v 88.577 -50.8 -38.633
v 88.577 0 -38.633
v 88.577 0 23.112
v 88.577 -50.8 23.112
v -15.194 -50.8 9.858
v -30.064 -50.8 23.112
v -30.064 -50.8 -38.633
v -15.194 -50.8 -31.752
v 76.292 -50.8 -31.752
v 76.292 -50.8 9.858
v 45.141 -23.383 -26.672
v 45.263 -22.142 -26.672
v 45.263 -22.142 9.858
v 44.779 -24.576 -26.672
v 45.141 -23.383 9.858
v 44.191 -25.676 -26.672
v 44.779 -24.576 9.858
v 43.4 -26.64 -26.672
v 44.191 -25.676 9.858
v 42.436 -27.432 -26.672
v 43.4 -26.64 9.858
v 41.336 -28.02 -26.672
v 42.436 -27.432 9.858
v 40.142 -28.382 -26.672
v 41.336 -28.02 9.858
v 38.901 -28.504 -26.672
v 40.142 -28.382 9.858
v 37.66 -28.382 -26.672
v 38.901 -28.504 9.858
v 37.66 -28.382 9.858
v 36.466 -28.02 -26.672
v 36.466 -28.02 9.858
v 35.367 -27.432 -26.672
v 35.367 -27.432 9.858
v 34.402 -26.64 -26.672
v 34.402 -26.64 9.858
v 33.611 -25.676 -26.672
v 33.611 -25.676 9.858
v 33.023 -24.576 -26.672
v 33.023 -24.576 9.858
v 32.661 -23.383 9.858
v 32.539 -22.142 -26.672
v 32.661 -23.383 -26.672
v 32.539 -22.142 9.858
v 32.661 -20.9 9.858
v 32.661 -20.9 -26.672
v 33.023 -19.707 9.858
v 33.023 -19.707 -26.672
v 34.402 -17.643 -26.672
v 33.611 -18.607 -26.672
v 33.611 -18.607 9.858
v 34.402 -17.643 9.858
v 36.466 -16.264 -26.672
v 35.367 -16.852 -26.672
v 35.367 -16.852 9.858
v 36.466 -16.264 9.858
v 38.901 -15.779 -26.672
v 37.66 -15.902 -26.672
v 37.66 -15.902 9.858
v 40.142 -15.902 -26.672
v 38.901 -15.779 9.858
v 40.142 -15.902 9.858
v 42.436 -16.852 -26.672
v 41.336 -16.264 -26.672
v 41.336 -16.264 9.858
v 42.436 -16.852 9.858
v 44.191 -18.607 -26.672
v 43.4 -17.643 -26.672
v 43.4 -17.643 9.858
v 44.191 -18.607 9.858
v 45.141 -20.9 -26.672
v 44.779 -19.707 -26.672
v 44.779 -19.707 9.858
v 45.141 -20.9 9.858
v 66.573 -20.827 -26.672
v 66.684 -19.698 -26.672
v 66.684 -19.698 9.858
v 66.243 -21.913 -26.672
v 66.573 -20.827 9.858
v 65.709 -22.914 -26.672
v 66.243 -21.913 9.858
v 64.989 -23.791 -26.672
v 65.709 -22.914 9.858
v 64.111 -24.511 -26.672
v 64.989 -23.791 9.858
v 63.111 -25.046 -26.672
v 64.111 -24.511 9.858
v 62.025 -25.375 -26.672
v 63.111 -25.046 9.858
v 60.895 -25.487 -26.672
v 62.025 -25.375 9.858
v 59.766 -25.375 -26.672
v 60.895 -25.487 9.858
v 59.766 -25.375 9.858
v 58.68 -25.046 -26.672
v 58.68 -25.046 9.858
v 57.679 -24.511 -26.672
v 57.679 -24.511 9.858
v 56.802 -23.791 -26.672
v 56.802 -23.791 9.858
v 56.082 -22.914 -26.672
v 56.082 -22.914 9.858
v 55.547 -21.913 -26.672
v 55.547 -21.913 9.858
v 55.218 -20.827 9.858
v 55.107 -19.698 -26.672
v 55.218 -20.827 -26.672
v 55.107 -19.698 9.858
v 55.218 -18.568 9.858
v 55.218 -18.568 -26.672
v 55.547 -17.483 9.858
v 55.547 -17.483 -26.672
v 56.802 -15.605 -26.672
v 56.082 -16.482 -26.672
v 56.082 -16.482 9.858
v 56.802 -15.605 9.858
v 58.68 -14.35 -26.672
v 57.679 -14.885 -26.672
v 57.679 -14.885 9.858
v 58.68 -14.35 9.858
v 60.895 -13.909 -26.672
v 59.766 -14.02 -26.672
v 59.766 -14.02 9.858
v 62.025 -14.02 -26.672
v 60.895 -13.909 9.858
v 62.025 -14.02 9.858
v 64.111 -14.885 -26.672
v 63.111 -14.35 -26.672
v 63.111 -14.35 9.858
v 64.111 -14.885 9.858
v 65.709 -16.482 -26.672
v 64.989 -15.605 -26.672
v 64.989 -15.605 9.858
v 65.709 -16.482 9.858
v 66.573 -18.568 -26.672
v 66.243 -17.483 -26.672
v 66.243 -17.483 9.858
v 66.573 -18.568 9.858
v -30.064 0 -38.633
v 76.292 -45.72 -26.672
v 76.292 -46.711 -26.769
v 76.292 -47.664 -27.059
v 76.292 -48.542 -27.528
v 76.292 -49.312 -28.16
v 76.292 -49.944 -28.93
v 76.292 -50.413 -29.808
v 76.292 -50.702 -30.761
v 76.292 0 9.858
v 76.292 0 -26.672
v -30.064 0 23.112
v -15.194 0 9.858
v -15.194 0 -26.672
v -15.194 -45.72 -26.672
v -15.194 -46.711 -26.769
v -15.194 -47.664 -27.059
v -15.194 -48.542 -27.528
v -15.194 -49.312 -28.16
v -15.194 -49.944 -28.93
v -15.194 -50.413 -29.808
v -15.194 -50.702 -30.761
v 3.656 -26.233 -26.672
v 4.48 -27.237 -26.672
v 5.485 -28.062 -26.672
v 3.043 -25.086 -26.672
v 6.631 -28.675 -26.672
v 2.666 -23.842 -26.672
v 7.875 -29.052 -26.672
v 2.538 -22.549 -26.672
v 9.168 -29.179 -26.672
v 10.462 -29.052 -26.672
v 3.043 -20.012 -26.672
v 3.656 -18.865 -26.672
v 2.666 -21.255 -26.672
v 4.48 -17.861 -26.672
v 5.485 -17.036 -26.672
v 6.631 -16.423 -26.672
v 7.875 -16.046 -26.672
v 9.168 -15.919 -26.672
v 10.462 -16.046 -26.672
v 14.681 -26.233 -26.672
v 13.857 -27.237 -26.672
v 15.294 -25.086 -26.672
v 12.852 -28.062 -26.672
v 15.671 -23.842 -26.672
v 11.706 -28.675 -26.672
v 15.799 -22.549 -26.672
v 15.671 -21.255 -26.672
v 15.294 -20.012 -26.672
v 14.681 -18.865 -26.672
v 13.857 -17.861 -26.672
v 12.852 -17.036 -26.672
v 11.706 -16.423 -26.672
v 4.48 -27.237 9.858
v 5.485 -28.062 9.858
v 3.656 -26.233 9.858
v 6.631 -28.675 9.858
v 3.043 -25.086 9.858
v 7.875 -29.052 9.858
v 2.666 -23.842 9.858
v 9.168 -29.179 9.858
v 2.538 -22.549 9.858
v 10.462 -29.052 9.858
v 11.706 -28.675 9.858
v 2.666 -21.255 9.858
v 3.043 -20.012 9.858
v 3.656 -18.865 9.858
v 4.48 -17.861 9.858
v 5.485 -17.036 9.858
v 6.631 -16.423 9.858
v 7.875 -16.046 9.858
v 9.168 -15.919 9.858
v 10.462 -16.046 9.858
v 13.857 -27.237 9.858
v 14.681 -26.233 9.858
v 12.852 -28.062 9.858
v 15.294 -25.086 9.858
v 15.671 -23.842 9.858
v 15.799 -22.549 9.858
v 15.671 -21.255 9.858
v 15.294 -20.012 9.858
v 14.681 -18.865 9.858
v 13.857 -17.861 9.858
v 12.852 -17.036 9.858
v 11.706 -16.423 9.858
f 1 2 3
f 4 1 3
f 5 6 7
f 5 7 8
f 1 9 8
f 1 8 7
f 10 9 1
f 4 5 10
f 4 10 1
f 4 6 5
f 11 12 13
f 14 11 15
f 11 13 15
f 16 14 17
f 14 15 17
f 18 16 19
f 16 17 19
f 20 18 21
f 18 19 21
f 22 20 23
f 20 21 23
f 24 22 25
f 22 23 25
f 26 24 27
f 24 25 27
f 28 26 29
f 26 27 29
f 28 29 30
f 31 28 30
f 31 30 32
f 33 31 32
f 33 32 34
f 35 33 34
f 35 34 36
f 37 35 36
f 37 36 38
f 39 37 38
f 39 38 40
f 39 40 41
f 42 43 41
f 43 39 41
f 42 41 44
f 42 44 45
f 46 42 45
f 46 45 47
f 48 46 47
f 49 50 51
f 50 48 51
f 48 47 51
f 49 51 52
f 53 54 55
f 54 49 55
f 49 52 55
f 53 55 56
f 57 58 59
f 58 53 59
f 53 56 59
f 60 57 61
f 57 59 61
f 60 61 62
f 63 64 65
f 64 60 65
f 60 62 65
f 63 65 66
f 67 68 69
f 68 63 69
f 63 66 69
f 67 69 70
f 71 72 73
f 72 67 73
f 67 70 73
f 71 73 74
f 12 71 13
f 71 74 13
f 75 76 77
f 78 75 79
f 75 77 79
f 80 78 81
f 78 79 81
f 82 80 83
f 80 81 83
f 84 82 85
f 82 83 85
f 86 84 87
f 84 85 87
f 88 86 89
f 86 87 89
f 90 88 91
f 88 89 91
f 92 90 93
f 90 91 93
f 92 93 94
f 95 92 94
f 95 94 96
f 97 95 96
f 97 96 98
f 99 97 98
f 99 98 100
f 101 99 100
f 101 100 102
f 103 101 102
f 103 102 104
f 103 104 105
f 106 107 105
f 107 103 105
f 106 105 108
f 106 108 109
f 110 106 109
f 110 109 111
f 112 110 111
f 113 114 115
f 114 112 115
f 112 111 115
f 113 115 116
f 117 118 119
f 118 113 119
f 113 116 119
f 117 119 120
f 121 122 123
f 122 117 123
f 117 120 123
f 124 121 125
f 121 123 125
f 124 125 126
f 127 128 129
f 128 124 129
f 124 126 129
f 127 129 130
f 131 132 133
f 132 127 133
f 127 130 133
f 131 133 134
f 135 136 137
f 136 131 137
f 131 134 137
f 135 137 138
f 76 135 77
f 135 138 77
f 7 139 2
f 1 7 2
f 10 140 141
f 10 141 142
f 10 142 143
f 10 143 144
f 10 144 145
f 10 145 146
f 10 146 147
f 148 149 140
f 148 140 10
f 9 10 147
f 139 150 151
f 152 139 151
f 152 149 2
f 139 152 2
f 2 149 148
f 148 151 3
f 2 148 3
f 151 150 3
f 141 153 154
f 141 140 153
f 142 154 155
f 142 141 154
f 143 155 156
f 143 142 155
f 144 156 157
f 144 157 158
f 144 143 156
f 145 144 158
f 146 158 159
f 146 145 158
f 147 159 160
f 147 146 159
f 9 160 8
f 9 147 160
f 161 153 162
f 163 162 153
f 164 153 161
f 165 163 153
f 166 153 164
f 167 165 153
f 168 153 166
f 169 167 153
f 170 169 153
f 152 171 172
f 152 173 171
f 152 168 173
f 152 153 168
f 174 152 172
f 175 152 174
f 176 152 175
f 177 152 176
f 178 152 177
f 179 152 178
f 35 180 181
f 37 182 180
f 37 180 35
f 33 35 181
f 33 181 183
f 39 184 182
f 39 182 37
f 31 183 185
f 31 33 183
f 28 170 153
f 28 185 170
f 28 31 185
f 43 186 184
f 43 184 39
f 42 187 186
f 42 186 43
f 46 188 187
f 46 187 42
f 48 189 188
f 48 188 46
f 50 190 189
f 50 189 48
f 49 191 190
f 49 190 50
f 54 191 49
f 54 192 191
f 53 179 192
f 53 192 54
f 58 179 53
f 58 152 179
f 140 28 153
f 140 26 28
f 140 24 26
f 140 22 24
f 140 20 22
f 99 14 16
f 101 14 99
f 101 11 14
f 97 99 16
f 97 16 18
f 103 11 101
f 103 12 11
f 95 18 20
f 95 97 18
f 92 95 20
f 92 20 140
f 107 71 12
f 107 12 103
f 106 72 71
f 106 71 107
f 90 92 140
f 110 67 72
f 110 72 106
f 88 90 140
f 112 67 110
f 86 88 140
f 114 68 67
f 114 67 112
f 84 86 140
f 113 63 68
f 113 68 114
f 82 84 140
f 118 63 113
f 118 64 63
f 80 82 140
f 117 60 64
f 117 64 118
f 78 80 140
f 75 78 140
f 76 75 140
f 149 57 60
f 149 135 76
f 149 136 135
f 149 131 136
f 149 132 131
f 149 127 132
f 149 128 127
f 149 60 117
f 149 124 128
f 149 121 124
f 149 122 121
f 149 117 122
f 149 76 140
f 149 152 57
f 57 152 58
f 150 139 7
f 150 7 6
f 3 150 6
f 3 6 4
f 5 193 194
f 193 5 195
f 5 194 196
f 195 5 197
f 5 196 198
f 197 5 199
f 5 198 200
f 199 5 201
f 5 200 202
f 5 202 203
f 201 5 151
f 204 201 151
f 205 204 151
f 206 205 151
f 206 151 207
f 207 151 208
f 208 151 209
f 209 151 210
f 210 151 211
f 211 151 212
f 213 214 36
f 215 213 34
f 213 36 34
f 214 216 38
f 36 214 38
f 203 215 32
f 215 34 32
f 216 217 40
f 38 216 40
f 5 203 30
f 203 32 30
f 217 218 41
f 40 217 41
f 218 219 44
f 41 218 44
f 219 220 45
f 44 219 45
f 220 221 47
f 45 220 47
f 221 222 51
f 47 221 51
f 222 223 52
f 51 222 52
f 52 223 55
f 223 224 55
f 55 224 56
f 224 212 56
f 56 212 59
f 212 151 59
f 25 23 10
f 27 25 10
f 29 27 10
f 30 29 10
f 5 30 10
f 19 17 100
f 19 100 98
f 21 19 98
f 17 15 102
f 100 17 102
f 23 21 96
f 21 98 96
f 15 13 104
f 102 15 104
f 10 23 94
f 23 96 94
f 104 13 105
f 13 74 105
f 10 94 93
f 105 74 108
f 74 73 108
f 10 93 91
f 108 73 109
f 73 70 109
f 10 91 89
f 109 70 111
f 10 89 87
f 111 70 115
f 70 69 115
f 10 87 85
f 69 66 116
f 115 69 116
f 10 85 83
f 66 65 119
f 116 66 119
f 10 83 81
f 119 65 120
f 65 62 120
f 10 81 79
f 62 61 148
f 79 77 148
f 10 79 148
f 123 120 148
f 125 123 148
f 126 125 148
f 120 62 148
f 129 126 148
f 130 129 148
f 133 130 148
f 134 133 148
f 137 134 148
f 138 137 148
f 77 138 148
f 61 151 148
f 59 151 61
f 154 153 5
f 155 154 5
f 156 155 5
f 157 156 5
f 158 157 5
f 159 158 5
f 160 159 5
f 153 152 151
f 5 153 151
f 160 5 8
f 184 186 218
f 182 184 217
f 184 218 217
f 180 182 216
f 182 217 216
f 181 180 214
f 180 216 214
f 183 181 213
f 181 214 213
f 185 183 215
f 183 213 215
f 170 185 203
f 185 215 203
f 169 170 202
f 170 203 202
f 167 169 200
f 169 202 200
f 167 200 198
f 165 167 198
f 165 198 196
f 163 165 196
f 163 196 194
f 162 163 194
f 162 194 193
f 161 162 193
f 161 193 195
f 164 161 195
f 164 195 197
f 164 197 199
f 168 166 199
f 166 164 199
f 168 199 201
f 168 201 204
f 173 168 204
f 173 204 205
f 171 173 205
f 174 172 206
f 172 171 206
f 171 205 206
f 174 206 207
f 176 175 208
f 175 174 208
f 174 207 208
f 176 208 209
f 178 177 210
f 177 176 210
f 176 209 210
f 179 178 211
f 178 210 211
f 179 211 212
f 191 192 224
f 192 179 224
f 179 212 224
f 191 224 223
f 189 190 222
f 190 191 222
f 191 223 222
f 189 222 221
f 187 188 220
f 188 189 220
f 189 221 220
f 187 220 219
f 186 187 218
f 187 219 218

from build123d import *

# Parameters (mm, degrees)
F0_W     = 118.6410989612
F0_H     = 61.7450922728
F0_W_2   = 91.4861774072
F0_H_2   = 36.5298185498
F1_DEPTH = 50.8
F2_R     = 6.3622008296
F2_R_2   = 5.7887908355
F2_R_3   = 6.6303332555
F3_DEPTH = 48.26
F4_R     = 5.08


with BuildPart() as f1:
    # F0 (on Front) → F1 (new body)
    with BuildSketch(Plane.XZ):
        with Locations((29.2561845854, -7.7603831887)):
            Rectangle(F0_W, F0_H)
        with Locations((30.5492696352, -8.4069287404)):
            Rectangle(F0_W_2, F0_H_2, mode=Mode.SUBTRACT)
    extrude(amount=F1_DEPTH)

    # F2 (on face) → F3 (join)
    with BuildSketch(Plane(origin=(0, 0, 9.8579805344), x_dir=(1, 0, 0), z_dir=(0, 0, -1))):
        with Locations((38.9011949301, 22.1416186541)):
            Circle(F2_R)
        with Locations((60.8952976763, 19.697830081)):
            Circle(F2_R_2)
        with Locations((9.1684339568, 22.548917681)):
            Circle(F2_R_3)
    extrude(amount=F3_DEPTH)

    # F4
    f4_edges = [f1.edges().sort_by_distance(p)[0] for p in [
        (30.54927, -50.8, -26.671838),
    ]]
    fillet(f4_edges, radius=F4_R)


solid = f1.part
